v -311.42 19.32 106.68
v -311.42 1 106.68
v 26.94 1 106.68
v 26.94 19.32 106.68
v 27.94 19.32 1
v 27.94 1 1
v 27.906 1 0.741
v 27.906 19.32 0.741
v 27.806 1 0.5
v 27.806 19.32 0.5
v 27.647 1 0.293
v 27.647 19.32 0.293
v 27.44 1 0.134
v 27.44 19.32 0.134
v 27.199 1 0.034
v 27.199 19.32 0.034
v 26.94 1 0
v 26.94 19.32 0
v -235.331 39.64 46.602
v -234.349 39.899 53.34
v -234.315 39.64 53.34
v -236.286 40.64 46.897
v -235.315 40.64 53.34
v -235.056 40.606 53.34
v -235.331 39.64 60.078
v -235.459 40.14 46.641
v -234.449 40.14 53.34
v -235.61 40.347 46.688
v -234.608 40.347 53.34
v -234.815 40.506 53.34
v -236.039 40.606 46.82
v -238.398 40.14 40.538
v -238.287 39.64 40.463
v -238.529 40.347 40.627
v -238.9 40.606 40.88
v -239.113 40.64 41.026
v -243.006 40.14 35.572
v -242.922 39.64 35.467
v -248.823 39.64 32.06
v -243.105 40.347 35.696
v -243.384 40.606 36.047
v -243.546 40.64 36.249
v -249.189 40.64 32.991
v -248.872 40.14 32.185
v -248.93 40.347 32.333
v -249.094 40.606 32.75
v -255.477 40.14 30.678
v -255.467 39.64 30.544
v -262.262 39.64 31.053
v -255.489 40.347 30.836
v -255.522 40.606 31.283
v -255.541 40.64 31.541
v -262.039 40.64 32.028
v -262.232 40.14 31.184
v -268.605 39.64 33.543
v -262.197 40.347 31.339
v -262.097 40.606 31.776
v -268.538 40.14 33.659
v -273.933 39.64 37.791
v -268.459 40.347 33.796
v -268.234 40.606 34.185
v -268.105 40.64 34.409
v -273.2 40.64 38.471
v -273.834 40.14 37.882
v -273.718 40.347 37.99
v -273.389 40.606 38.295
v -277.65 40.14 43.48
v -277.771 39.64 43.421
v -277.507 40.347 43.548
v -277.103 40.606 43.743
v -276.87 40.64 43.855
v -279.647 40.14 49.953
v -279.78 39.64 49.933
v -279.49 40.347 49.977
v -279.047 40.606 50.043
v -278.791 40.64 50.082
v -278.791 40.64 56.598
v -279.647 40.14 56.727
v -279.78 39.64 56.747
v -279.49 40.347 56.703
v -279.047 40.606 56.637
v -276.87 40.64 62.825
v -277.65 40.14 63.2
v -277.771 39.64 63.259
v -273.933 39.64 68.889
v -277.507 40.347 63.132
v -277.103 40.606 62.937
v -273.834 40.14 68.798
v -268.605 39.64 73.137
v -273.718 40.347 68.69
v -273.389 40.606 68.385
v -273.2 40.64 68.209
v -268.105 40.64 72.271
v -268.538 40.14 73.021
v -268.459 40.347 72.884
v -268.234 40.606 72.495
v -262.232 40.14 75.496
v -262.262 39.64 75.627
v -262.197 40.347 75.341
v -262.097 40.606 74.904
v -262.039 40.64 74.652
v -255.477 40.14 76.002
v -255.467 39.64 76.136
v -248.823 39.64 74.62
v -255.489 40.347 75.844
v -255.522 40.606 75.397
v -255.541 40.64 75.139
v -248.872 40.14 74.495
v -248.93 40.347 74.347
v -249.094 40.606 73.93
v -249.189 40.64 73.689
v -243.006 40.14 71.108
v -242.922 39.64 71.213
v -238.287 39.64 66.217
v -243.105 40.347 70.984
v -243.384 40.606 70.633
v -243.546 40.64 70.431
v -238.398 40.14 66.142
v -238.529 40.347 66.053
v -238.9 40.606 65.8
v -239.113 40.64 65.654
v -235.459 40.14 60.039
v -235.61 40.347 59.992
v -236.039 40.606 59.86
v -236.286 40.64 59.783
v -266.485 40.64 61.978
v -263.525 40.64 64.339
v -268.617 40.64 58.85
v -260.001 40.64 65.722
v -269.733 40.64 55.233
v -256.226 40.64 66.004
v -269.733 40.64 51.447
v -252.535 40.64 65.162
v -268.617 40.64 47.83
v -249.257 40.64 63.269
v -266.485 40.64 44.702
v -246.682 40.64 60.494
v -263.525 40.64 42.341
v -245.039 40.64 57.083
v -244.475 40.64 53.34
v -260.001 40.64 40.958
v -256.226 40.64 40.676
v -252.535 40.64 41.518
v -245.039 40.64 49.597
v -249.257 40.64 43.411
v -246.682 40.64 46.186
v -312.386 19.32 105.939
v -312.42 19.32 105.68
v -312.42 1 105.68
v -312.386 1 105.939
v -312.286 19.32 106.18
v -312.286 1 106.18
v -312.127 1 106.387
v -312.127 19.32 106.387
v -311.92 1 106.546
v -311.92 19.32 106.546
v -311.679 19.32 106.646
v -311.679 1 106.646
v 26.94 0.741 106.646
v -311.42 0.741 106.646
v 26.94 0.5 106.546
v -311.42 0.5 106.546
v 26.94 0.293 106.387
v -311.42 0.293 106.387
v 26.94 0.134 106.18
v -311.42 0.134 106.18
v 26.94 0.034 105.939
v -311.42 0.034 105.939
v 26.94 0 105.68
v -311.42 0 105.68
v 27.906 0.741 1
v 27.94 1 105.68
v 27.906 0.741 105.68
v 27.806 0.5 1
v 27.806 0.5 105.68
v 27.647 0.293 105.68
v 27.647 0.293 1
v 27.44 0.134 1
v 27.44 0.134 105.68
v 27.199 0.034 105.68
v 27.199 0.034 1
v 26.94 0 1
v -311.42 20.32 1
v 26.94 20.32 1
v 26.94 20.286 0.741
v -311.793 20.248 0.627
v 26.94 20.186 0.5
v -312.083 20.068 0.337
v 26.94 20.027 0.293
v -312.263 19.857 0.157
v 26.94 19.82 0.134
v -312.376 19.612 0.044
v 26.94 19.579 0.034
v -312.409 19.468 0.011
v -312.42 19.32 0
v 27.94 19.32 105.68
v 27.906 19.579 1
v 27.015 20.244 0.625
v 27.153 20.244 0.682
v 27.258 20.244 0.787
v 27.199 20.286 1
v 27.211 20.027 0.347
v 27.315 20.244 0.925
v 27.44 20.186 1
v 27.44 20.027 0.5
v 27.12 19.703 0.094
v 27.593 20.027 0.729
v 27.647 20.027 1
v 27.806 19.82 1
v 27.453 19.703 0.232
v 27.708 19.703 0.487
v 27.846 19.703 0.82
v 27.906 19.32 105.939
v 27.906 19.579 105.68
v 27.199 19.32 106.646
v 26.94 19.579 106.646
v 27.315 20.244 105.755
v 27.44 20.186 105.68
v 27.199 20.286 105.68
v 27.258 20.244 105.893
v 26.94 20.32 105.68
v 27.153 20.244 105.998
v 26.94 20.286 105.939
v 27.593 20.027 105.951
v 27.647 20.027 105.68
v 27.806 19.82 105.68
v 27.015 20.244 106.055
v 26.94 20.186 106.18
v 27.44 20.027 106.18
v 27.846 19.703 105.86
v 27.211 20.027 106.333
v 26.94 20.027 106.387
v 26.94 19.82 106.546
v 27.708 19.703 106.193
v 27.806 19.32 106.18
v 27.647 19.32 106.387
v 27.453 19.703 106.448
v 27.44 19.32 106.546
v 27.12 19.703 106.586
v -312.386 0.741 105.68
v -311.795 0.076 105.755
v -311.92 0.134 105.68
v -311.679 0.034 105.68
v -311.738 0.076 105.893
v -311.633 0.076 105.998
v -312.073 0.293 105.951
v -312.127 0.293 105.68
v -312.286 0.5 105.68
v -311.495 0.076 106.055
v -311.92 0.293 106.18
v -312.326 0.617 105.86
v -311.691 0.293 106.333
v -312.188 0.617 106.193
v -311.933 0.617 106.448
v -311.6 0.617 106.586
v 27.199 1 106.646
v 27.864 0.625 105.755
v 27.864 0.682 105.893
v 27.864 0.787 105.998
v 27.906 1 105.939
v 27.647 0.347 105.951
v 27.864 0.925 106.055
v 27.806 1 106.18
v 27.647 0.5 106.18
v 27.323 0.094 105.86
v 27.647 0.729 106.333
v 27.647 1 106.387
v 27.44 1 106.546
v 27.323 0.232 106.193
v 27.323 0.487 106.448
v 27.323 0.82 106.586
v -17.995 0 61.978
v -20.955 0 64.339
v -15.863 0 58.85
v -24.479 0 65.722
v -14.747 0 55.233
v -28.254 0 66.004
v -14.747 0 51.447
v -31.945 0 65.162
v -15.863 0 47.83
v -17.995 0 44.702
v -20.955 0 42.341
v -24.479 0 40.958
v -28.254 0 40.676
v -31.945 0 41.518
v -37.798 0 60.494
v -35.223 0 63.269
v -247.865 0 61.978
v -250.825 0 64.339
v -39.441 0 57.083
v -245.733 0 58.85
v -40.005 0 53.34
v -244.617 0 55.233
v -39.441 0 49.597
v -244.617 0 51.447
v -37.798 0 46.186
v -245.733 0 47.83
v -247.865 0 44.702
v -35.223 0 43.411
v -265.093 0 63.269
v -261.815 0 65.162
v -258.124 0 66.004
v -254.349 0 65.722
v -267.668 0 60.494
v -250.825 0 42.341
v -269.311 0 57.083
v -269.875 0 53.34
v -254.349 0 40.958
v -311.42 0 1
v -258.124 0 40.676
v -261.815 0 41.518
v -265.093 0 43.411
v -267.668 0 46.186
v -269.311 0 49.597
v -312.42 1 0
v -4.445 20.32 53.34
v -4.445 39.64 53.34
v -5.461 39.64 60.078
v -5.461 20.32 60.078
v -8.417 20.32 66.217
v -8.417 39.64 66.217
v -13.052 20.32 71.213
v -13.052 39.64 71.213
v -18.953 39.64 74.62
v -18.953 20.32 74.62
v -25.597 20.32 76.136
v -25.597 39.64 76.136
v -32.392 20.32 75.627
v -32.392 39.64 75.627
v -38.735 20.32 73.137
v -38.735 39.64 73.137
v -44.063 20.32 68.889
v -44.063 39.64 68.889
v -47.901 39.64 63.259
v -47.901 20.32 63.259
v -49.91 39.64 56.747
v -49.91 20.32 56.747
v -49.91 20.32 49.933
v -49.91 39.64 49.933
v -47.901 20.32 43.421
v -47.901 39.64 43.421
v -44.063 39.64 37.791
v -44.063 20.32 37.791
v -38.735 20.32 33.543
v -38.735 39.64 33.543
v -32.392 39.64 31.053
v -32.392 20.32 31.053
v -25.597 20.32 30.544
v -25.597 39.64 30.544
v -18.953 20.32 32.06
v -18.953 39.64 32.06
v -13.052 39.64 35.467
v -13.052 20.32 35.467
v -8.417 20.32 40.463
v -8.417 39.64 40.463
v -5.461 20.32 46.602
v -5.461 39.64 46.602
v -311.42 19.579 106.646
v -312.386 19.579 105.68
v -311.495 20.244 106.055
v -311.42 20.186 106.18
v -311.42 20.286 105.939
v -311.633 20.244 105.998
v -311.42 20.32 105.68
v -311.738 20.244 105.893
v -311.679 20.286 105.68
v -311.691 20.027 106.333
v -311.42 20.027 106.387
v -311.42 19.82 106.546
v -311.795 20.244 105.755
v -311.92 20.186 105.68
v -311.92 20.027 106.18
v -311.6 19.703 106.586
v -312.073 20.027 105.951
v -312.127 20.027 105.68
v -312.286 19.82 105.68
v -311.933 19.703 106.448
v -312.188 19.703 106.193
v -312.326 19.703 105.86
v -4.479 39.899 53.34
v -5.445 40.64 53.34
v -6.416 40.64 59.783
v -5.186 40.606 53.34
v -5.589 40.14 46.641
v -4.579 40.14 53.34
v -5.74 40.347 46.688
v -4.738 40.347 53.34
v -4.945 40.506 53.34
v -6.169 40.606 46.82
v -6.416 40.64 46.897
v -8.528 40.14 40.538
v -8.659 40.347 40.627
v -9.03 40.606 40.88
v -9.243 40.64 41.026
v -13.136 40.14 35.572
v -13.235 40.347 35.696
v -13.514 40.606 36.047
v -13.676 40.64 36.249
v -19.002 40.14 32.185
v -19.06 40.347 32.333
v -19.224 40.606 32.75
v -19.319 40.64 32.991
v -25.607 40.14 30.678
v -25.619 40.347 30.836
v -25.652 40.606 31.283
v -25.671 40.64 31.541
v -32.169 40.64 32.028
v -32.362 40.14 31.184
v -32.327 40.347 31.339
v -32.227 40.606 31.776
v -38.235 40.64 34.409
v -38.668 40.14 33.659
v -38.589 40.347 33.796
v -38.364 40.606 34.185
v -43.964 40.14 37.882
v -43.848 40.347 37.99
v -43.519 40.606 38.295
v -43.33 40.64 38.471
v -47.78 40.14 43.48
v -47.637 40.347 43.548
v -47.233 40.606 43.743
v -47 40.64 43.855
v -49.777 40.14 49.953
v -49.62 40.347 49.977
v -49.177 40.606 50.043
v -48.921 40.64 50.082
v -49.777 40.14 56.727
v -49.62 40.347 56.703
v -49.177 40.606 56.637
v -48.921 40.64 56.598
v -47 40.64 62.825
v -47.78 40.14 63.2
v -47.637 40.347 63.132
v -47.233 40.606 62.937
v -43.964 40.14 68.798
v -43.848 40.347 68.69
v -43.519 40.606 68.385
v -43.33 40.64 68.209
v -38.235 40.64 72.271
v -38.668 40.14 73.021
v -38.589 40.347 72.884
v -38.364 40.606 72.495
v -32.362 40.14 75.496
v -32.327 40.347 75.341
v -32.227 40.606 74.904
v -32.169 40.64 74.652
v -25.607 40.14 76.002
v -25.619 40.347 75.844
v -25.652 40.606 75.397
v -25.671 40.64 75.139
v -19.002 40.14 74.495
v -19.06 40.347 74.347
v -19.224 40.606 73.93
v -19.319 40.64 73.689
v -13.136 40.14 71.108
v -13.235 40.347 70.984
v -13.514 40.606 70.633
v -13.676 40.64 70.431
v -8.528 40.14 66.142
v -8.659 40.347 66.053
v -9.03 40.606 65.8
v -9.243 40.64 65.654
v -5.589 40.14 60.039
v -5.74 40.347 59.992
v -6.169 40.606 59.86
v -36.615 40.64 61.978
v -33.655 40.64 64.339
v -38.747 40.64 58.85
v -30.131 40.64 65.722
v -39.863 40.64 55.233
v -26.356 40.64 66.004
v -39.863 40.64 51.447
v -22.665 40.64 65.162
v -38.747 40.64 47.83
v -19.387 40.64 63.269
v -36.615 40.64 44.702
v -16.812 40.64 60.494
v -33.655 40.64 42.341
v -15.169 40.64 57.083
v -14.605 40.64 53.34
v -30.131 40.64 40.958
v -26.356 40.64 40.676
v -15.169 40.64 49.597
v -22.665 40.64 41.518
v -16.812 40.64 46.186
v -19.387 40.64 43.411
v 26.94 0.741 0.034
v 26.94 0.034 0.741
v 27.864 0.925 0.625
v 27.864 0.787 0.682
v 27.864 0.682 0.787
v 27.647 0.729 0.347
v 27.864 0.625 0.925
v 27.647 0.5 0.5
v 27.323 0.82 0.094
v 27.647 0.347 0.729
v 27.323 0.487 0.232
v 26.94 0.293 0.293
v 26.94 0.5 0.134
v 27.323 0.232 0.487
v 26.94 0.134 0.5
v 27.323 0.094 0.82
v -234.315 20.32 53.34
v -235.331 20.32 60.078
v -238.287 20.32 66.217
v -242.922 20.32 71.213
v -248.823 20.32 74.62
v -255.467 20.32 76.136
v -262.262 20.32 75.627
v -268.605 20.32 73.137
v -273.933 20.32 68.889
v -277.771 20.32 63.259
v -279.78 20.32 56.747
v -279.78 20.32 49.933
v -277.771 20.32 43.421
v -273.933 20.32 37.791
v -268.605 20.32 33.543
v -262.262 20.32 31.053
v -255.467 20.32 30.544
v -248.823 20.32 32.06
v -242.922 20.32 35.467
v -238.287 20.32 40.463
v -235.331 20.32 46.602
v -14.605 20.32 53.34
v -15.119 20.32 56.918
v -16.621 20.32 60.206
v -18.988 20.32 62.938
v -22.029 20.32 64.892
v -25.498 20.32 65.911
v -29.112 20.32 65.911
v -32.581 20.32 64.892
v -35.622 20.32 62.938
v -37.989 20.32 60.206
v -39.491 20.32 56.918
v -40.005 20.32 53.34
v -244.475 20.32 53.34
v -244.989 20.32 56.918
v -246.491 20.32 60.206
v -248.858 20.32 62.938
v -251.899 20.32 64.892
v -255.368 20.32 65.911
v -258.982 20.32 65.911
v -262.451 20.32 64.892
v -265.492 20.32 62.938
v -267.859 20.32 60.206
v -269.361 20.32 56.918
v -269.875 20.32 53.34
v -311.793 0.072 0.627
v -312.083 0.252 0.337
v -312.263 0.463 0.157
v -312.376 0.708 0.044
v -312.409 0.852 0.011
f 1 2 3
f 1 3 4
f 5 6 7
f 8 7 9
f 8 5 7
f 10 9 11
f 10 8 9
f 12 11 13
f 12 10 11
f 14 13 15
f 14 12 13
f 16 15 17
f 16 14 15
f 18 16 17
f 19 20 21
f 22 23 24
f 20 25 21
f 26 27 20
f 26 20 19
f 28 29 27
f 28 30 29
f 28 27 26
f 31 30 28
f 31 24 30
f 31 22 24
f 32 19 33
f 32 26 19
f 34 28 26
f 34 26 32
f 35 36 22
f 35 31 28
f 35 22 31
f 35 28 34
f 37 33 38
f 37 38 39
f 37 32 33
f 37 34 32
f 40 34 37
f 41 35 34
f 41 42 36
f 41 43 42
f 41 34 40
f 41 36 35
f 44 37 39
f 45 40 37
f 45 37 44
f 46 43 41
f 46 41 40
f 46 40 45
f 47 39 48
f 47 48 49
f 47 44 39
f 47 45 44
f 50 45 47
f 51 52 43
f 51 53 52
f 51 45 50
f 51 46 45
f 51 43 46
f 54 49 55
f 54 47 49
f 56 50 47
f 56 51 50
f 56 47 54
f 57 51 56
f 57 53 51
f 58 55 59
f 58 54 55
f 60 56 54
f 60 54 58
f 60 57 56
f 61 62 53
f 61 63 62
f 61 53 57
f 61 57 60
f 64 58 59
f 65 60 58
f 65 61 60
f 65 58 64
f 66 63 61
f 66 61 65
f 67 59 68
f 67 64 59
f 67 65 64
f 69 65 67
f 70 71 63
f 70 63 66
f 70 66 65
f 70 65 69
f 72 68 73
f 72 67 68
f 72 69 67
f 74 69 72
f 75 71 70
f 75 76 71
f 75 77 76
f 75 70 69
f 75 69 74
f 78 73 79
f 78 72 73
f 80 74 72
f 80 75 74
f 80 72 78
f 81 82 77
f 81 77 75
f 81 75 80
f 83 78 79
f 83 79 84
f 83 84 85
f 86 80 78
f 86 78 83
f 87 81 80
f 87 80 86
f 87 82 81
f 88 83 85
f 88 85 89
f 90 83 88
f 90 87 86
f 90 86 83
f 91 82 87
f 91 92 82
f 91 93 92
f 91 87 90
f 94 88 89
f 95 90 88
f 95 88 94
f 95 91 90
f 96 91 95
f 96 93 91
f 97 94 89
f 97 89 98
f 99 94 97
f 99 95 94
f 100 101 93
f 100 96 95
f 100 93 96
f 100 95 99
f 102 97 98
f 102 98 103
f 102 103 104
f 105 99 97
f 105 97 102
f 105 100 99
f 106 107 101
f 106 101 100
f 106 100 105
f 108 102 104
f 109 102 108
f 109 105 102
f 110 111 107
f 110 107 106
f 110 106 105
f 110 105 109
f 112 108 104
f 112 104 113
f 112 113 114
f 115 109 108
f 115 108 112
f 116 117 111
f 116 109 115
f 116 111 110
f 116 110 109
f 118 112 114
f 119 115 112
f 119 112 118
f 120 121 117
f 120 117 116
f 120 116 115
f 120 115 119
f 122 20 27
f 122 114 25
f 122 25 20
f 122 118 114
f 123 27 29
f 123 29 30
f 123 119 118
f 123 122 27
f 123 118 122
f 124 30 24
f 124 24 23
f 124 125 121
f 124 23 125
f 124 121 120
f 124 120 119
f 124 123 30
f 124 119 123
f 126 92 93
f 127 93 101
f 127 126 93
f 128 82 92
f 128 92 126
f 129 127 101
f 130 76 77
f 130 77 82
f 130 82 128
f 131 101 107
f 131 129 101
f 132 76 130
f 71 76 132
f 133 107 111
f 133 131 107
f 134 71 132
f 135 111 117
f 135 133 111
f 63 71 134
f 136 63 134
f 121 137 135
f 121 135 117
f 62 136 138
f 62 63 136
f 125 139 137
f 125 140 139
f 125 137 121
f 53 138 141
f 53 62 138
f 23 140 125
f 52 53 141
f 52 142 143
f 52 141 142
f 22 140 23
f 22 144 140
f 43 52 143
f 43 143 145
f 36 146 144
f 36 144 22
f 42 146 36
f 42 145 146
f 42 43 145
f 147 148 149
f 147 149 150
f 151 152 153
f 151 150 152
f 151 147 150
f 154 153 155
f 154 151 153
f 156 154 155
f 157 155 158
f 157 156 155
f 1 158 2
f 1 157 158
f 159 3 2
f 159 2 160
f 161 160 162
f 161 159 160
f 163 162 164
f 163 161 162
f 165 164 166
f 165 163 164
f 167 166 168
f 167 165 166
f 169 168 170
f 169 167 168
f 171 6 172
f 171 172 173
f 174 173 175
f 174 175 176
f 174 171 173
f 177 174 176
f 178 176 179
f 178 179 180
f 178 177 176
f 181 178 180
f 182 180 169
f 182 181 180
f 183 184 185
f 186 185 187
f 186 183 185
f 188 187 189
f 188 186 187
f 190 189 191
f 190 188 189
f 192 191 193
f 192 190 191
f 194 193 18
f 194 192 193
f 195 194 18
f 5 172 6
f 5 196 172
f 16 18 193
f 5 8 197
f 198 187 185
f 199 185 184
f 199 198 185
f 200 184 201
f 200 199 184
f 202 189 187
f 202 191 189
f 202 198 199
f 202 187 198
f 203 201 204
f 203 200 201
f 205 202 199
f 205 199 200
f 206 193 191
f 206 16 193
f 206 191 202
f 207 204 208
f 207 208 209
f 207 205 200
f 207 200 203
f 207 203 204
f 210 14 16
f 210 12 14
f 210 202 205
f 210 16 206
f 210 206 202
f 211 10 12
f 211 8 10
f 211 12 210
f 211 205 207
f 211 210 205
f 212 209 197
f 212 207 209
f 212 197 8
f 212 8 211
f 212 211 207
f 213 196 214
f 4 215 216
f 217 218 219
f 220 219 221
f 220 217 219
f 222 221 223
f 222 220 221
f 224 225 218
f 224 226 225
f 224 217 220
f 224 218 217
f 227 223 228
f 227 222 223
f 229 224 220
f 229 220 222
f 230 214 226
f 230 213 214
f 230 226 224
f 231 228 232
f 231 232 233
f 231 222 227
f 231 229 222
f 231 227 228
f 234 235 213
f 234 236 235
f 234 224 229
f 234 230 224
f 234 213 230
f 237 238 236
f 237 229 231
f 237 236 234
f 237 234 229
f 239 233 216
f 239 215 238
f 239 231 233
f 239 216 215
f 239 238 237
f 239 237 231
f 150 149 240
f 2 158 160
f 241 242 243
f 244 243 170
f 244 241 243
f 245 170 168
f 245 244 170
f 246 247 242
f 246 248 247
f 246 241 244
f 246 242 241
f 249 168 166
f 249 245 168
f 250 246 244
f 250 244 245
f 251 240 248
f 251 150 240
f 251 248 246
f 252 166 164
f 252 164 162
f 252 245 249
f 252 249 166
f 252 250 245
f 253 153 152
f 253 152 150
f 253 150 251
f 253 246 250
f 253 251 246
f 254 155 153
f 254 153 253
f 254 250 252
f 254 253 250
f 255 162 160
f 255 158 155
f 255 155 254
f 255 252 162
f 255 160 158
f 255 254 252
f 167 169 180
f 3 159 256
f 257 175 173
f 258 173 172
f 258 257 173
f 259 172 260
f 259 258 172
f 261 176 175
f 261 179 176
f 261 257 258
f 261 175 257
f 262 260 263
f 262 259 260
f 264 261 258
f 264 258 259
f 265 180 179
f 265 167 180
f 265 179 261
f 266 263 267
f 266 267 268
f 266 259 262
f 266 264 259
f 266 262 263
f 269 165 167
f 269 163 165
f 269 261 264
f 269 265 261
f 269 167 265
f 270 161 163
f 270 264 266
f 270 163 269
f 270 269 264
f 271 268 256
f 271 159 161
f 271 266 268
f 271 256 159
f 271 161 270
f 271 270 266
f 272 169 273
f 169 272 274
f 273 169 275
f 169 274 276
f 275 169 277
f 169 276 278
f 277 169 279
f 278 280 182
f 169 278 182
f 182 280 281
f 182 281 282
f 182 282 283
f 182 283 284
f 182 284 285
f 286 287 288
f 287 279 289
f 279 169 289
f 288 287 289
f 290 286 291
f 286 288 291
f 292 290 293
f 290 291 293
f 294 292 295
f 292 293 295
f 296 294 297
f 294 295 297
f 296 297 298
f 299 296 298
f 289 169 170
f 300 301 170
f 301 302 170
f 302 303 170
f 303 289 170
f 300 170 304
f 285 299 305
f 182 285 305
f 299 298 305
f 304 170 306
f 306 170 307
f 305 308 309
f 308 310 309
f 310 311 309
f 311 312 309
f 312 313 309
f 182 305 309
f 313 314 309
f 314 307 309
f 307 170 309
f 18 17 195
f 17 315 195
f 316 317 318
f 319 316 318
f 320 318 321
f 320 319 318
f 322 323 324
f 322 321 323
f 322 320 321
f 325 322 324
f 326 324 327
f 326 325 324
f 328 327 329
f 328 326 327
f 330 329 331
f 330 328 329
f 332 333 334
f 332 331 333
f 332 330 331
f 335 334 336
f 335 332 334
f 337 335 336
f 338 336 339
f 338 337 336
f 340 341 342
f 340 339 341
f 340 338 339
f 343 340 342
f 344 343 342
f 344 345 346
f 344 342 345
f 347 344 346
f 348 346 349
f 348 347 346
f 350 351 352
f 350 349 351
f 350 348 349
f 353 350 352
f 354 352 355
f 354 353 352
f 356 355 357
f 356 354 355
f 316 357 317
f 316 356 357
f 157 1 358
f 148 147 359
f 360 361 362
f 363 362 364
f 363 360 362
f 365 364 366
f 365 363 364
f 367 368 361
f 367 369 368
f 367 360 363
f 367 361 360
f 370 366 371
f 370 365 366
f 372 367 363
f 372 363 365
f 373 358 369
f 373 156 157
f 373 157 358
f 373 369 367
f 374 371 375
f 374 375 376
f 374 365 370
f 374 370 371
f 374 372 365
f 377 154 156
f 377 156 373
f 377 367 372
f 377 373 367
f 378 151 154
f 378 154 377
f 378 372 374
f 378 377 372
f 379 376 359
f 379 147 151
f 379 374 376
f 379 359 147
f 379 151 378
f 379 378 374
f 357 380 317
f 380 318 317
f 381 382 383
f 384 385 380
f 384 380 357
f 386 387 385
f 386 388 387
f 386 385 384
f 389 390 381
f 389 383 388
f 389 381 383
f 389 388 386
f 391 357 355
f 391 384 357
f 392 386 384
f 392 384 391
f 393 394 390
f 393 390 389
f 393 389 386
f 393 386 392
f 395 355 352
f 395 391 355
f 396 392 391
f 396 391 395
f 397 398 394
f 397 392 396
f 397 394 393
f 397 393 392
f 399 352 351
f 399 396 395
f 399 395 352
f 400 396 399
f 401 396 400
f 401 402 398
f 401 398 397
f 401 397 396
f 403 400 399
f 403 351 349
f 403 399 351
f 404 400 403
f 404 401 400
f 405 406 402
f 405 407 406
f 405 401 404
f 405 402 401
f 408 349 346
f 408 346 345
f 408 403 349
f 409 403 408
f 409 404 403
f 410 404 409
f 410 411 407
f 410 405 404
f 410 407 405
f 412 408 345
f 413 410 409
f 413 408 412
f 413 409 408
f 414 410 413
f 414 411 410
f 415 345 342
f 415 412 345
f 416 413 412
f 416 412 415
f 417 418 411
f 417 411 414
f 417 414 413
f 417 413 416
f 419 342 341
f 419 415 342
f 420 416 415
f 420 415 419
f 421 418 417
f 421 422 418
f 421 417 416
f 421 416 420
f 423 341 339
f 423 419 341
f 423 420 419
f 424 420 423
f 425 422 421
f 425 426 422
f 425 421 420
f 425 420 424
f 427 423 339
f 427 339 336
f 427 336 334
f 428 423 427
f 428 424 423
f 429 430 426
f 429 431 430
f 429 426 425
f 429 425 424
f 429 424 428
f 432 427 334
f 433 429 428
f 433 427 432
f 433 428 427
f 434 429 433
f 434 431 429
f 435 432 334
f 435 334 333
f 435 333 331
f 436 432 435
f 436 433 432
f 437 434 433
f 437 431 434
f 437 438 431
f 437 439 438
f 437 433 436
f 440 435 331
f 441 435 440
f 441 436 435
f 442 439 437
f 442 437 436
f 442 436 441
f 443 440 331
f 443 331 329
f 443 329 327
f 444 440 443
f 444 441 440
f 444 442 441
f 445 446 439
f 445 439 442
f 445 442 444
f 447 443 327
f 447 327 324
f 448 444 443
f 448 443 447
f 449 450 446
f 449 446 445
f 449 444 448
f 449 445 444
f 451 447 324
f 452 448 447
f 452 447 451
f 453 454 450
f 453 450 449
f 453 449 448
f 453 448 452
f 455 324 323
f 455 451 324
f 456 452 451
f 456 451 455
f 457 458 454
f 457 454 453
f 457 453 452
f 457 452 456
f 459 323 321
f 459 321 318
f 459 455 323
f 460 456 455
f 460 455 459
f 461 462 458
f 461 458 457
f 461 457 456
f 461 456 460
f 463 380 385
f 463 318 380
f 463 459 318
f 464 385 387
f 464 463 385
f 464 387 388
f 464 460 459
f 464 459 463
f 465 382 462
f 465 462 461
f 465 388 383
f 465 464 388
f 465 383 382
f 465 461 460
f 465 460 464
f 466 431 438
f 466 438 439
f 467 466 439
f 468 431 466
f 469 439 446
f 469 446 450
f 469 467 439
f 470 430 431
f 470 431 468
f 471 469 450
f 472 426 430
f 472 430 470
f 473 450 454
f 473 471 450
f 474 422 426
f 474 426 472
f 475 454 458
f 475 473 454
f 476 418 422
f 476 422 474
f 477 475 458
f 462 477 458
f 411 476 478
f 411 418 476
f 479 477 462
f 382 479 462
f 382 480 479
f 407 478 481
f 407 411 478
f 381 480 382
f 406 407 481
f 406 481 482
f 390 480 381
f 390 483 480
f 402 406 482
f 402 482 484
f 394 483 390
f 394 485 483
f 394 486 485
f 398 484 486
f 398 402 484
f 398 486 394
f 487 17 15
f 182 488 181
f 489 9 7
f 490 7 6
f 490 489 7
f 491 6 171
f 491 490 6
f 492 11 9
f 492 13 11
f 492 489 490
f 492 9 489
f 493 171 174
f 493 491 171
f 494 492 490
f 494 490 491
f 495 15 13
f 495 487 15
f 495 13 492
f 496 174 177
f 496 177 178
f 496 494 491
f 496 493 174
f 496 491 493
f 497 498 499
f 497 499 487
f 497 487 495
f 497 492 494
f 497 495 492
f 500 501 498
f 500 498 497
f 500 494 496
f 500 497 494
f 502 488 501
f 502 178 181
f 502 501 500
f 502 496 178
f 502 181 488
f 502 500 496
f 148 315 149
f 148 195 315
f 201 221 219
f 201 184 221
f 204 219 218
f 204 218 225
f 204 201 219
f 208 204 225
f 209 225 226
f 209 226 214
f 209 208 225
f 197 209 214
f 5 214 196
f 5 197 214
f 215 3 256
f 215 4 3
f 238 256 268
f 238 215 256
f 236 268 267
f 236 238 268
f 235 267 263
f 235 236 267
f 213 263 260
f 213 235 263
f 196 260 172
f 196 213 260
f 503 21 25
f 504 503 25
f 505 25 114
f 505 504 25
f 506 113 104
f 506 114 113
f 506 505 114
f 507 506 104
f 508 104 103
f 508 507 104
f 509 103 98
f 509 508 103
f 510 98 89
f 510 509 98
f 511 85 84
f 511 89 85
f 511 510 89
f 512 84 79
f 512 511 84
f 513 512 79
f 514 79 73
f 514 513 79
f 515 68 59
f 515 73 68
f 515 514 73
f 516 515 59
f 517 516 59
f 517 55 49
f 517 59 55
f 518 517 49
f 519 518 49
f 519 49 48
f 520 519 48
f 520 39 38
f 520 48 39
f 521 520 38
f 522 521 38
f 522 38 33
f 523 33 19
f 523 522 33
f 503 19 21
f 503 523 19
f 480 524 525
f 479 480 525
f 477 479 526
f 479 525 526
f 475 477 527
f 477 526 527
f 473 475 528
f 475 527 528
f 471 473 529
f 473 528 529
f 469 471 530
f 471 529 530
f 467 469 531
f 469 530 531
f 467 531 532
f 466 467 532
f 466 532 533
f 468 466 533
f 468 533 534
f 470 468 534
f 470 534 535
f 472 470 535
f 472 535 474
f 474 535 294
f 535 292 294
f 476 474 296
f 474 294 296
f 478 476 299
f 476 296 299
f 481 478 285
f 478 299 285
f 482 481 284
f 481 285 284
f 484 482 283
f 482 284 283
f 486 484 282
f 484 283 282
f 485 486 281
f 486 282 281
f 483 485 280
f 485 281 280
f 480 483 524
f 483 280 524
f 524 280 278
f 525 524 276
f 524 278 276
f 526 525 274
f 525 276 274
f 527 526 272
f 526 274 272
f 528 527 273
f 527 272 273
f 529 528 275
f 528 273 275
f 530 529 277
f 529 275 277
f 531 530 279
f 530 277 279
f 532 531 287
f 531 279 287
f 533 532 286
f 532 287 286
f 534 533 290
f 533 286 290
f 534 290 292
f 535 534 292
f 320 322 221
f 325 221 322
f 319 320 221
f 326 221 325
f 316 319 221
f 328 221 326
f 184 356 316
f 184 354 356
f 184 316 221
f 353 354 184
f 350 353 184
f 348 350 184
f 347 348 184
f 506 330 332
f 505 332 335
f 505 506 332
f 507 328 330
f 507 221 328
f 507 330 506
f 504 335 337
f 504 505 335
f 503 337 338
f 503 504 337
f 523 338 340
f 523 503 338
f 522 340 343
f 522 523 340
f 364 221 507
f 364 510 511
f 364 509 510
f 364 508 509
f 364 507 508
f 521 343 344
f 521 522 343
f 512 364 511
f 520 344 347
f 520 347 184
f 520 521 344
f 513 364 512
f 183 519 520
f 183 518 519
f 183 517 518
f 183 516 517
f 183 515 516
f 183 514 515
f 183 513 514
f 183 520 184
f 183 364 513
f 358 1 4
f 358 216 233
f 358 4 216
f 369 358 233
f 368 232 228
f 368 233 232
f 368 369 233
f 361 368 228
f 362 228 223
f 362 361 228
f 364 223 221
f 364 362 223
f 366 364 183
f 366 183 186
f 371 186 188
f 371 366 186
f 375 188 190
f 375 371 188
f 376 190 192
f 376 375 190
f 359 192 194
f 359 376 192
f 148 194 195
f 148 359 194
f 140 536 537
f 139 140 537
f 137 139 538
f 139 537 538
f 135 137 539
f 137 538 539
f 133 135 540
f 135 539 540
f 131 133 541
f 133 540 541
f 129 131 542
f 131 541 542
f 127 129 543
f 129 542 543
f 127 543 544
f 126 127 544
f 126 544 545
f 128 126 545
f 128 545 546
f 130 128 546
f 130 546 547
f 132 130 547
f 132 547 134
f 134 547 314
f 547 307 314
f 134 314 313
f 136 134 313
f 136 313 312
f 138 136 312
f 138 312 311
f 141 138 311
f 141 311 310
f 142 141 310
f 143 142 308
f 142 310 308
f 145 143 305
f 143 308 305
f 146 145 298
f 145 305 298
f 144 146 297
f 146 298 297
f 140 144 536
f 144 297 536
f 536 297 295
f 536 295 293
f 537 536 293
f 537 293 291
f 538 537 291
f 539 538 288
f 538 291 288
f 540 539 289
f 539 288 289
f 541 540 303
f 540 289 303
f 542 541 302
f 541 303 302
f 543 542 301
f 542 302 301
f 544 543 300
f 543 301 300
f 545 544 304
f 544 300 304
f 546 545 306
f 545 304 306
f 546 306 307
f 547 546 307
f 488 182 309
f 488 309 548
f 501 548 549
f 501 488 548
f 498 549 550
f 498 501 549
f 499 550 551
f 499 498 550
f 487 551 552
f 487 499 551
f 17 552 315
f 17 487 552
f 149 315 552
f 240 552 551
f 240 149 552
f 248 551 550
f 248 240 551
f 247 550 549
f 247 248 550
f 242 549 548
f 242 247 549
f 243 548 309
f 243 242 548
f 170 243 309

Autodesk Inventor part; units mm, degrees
ref_plane "YZ Plane" through (0, 0, 0) normal (1, 0, 0) x (0, 1, 0)
ref_plane "XZ Plane" through (0, 0, 0) normal (0, 1, 0) x (-1, 0, 0)
ref_plane "XY Plane" through (0, 0, 0) normal (0, 0, 1) x (1, 0, 0)
sketch "Sketch1" plane through (0, 0, 0) normal (0, 1, 0) x (-1, 0, 0)
  line L0 (0, 0) -> (284.48, 0)
  line L1 (284.48, 0) -> (284.48, 106.68)
  line L2 (284.48, 106.68) -> (0, 106.68)
  line L3 (0, 106.68) -> (0, 0)
  line L4 (0, 53.34) -> (27.305, 53.34) construction
  line L5 (284.48, 53.34) -> (257.175, 53.34) construction
  circle A0 centre (27.305, 53.34) radius 12.7
  circle A1 centre (257.175, 53.34) radius 12.7
  dimension "d0" = 284.48
  dimension "d1" = 106.68
  dimension "d2" = 27.305
  dimension "d3" = 27.305
  dimension "d4" = 25.4
  dimension "d5" = 25.4
extrude "Extrusion1" add sketch "Sketch1" along normal blind 20.32
sketch "Sketch2" plane through (0, 20.32, 0) normal (0, 1, 0) x (1, 0, 0)
  circle A0 centre (-257.175, -53.34) radius 12.7 projected
  circle A1 centre (-27.305, -53.34) radius 12.7 projected
  circle A2 centre (-257.175, -53.34) radius 22.86
  circle A3 centre (-27.305, -53.34) radius 22.86
  dimension "d8" = 45.72
  dimension "d9" = 45.72
extrude "Extrusion2" add sketch "Sketch2" along normal blind 20.32
sketch "Sketch3" plane through (-284.48, 0, 0) normal (-1, 0, 0) x (0, 0, 1)
  line L0 (0, 0) -> (106.68, 0) projected
  line L1 (106.68, 0) -> (106.68, 20.32) projected
  line L2 (0, 20.32) -> (106.68, 20.32) projected
  line L3 (0, 0) -> (0, 20.32) projected
extrude "Extrusion3" add sketch "Sketch3" along normal blind 27.94
sketch "Sketch4" plane through (0, 0, 106.68) normal (1, 0, 0) x (0, 0, -1)
  line L0 (0, 0) -> (106.68, 0) projected
  line L1 (106.68, 0) -> (106.68, 20.32) projected
  line L2 (0, 20.32) -> (106.68, 20.32) projected
  line L3 (0, 0) -> (0, 20.32) projected
extrude "Extrusion4" add sketch "Sketch4" along normal blind 27.94
fillet "Fillet1" radius 1 13 edges at (-312.42, 10.16, 106.68) (-142.24, 0, 106.68) (-142.24, 0, 0) (-312.42, 0, 53.34) (27.94, 0, 53.34) (27.94, 10.16, 106.68) (27.94, 10.16, 0) (-142.24, 20.32, 0) (27.94, 20.32, 53.34) (-142.24, 20.32, 106.68) (-312.42, 20.32, 53.34) (-280.035, 40.64, 53.34) (-50.165, 40.64, 53.34)
equation "\"d2\" = d3"
properties part number "CIM MountBase" material "Aluminum 6061, Welded"
